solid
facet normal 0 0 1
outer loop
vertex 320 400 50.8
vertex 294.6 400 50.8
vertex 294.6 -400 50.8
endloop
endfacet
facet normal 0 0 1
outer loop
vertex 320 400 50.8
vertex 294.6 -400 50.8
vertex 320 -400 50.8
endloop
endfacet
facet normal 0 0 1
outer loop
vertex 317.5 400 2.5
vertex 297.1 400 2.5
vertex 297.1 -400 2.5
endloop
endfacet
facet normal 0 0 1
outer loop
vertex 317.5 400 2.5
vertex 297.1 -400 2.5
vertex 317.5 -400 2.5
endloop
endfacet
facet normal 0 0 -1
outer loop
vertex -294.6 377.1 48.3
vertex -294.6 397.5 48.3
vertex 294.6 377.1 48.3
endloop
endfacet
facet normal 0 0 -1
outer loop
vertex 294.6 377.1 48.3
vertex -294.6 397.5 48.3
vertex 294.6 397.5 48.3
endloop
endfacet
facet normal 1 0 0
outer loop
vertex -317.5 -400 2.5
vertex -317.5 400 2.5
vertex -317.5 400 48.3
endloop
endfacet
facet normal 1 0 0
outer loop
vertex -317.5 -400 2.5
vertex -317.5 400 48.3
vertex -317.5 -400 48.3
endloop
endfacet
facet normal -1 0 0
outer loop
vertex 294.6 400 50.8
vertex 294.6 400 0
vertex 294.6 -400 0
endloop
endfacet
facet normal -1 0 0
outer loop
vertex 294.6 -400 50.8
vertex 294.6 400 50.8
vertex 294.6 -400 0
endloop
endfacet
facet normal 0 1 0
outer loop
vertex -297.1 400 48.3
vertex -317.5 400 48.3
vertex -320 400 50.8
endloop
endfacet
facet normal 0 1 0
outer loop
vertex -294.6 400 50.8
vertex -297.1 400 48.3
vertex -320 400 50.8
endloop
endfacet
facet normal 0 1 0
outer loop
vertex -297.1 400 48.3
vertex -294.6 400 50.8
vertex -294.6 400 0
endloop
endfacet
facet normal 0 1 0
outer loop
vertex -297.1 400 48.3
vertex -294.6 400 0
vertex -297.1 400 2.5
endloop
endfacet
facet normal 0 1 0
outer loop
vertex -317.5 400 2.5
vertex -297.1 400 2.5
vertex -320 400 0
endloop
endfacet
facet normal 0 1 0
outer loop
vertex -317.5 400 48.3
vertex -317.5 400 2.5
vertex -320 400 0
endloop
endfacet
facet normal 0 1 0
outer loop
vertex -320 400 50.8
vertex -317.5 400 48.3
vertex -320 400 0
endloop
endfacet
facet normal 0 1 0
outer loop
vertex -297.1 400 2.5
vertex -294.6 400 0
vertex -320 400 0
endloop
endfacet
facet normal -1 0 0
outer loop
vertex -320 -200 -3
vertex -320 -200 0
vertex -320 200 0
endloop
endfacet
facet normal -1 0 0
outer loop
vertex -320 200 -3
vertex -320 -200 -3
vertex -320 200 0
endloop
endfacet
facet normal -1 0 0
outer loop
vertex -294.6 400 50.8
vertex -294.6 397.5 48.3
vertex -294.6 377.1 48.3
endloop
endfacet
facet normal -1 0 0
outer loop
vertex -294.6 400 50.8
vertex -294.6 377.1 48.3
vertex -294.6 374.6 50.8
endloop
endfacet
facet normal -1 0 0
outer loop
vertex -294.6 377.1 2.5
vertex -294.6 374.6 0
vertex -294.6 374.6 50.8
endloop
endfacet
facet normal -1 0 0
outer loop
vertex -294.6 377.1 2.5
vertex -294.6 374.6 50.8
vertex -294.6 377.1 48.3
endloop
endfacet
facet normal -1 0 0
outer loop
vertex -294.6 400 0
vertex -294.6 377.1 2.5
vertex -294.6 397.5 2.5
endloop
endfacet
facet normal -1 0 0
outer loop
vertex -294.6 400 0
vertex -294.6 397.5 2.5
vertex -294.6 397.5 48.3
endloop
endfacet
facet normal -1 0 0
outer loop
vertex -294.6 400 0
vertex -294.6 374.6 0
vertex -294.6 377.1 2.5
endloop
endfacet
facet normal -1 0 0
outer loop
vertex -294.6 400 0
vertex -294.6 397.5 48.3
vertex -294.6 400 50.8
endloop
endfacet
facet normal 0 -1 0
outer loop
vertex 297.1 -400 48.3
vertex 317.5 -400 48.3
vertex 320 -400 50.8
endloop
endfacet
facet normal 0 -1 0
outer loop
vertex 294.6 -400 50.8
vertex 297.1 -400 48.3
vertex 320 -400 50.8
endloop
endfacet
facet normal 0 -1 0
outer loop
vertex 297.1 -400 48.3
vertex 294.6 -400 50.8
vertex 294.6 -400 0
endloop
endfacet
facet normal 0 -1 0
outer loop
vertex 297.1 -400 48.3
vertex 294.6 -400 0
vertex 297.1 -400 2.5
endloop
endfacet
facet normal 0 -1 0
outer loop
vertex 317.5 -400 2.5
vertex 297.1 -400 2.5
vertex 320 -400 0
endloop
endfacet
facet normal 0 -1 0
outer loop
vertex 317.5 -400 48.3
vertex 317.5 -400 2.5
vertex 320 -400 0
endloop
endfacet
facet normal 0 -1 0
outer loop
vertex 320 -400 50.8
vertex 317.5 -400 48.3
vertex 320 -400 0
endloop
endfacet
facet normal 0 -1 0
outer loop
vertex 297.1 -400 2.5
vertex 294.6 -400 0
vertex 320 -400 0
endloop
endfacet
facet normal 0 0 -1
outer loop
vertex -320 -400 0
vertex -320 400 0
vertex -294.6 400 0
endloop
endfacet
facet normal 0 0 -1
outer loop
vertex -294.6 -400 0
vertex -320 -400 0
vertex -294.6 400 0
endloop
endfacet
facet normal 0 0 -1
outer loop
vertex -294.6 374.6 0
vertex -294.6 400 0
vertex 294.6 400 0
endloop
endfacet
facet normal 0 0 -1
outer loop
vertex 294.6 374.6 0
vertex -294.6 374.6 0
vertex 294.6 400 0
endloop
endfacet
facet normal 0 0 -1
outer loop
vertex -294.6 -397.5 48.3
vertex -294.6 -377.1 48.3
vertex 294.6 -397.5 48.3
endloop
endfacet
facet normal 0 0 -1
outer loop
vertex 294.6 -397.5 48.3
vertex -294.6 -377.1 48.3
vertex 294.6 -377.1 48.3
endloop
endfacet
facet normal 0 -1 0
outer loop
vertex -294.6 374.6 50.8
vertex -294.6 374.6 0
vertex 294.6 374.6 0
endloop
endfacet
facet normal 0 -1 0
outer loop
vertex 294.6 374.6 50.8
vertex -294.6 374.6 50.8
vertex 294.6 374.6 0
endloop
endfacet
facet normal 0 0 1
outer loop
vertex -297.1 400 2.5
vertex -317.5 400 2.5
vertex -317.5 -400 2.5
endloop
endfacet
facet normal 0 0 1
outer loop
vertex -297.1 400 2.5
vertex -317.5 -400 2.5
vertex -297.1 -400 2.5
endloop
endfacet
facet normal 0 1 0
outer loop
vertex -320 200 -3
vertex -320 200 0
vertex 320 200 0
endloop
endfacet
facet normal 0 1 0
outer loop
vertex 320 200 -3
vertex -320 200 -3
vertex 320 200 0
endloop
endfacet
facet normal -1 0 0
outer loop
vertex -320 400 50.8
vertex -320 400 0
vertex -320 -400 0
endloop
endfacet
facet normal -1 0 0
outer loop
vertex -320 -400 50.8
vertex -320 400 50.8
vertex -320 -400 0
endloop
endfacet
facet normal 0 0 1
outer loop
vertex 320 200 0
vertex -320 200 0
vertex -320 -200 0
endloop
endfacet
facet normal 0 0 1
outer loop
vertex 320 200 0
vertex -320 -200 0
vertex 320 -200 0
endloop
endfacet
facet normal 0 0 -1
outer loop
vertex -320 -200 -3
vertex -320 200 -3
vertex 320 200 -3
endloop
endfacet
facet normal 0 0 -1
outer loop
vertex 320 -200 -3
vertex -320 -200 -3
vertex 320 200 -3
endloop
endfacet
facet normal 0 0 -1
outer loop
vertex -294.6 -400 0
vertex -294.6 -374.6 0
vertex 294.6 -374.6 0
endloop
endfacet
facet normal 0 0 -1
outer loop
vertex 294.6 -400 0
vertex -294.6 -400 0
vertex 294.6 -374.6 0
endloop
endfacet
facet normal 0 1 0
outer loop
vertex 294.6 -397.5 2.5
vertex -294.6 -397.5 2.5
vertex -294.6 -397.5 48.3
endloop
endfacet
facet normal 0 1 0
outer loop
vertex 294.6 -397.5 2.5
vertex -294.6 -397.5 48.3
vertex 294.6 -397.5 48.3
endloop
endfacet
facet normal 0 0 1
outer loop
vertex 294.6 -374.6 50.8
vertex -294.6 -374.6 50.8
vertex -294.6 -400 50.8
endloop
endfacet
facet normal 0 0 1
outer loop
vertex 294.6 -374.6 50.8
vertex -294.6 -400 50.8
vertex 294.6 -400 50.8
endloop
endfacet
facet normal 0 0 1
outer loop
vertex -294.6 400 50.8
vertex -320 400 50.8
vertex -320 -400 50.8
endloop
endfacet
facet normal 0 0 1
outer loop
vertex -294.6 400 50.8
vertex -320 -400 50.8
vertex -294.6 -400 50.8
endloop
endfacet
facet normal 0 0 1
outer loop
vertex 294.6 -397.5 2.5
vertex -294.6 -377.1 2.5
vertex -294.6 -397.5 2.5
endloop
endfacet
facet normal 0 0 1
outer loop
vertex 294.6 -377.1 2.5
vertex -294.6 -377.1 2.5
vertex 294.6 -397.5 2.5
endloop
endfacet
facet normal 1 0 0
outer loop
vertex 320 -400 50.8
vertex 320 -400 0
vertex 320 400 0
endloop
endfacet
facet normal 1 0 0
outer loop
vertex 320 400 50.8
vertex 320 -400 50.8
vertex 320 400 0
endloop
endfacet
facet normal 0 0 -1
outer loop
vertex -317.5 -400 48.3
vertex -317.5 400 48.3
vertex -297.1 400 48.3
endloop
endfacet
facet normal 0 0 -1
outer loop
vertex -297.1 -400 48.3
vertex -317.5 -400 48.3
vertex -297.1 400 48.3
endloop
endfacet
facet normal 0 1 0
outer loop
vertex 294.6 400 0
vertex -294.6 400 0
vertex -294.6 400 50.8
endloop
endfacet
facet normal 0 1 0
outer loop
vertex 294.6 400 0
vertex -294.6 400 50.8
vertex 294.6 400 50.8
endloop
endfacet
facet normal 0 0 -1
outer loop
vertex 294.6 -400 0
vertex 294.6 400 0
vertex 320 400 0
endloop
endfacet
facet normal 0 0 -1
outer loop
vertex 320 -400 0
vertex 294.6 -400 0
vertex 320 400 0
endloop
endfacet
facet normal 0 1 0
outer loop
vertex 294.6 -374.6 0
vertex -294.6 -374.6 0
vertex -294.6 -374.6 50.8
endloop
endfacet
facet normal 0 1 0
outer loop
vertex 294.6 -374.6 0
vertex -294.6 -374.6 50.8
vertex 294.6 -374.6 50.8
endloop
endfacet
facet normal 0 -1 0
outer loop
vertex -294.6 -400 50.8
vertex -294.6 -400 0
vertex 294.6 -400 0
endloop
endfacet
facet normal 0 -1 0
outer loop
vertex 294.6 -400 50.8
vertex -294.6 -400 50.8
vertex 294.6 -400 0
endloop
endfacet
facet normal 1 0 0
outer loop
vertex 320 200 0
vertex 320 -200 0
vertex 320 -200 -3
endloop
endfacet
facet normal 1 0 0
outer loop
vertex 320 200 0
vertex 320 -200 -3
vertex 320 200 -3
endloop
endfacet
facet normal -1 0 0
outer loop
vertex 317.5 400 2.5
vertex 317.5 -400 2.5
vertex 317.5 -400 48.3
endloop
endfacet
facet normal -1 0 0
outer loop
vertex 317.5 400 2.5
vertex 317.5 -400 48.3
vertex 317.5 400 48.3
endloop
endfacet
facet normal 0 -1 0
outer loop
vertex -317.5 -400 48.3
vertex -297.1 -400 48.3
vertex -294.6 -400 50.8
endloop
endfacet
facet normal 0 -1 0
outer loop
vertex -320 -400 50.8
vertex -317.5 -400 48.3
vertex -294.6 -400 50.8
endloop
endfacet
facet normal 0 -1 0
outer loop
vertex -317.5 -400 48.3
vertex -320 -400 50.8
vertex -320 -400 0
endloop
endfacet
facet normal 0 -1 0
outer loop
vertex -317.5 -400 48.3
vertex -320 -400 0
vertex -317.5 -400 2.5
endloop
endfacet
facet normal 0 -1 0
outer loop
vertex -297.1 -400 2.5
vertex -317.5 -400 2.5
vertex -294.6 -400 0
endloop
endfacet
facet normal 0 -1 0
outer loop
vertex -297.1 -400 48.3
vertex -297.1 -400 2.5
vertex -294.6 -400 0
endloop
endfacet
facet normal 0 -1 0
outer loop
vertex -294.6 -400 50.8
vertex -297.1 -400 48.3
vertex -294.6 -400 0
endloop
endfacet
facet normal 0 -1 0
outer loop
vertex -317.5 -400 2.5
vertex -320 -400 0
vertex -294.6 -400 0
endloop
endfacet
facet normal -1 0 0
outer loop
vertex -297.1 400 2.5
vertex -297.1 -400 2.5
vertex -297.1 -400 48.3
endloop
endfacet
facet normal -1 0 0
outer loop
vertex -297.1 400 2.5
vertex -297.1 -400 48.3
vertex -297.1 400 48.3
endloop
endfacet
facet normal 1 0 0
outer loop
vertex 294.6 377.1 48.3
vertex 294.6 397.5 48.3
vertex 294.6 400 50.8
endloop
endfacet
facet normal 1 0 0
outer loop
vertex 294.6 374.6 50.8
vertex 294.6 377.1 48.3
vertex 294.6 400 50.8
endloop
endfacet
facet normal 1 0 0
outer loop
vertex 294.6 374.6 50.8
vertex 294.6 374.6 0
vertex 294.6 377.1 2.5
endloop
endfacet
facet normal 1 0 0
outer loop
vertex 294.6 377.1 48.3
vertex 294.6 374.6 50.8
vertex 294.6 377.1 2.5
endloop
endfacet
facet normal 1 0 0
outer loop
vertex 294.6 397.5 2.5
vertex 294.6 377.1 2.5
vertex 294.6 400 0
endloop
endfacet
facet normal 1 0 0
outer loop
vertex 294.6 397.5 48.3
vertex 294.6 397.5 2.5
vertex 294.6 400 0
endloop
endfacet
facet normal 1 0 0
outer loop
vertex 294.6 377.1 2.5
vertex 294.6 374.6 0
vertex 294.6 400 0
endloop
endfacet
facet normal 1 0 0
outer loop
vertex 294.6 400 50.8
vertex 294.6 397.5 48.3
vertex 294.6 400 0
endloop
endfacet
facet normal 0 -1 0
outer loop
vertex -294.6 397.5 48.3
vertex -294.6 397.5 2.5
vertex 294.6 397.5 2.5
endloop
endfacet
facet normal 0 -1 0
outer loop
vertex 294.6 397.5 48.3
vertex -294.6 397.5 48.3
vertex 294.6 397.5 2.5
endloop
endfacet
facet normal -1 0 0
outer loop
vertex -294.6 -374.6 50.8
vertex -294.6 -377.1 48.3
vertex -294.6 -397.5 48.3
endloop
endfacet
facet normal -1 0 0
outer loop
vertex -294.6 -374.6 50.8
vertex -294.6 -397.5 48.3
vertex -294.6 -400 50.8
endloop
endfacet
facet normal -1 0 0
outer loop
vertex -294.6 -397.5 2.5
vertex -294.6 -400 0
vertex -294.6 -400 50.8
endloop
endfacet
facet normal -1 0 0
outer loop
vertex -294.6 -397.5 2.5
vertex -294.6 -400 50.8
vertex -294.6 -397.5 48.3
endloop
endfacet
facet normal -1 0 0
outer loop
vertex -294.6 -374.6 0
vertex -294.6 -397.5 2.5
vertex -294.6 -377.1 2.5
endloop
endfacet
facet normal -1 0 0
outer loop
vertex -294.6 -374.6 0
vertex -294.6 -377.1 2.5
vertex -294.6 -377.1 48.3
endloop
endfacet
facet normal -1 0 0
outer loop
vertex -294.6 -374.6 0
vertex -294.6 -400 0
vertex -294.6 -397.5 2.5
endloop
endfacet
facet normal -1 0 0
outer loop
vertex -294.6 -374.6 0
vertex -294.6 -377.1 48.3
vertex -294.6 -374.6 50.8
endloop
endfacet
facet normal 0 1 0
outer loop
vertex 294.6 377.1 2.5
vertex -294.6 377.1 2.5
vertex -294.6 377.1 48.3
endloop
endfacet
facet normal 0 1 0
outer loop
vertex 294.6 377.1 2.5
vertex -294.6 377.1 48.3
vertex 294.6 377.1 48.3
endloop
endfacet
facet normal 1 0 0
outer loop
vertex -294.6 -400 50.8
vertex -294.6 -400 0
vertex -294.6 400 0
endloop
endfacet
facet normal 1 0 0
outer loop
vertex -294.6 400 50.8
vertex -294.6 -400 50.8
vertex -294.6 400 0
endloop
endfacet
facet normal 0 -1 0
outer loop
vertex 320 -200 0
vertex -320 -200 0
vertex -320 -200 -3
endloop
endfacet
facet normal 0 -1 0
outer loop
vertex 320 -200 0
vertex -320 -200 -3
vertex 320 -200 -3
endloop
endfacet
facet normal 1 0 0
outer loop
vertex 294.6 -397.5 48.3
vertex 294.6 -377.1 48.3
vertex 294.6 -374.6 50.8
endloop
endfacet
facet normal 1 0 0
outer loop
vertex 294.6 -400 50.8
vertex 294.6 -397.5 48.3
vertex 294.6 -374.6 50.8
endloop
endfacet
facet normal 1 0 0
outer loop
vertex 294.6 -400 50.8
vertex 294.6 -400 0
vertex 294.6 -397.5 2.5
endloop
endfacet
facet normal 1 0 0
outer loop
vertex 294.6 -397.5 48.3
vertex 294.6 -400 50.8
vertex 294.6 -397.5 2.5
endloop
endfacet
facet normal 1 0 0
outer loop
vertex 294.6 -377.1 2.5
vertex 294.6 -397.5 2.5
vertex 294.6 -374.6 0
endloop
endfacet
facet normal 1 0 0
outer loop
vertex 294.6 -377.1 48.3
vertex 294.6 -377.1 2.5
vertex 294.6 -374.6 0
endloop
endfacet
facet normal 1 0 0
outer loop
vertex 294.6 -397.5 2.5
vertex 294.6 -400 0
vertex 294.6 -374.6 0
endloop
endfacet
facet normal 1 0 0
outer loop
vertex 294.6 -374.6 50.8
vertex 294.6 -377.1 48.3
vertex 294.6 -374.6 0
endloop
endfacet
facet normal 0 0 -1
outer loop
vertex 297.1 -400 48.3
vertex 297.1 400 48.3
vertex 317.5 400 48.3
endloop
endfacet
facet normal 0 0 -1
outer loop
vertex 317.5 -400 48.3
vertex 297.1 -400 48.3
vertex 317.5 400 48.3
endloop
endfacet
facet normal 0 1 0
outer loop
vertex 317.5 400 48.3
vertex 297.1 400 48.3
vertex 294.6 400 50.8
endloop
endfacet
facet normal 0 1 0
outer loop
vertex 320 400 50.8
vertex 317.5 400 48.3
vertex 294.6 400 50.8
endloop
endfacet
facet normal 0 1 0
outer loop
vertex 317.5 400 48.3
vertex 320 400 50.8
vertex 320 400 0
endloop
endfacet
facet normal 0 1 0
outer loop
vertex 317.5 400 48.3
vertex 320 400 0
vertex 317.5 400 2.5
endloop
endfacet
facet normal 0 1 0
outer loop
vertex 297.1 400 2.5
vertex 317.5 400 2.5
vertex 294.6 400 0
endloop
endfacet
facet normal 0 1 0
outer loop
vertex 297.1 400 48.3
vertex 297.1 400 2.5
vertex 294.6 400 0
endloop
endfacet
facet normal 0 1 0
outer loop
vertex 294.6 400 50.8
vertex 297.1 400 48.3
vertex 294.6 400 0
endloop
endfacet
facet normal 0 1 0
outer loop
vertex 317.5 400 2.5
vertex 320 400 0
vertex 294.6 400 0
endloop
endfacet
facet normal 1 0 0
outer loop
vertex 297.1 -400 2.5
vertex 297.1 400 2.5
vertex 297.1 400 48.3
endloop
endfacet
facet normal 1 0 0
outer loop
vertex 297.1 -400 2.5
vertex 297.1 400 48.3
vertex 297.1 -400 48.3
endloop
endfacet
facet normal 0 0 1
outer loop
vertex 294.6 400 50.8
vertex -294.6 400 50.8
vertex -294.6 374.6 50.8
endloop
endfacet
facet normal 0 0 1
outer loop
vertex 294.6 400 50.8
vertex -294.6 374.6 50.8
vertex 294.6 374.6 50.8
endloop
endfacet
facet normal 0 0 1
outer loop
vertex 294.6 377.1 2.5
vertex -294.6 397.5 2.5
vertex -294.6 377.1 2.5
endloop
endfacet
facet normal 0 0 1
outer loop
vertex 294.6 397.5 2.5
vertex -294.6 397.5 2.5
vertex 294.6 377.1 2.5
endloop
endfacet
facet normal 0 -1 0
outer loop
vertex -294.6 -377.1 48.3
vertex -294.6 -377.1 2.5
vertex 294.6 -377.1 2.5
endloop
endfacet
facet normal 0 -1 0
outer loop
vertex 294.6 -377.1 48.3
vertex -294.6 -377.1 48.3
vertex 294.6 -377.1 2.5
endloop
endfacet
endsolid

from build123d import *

# Parameters (mm, degrees)
F1_DEPTH = 50.8
F0_W     = 589.2
F0_H     = 25.4
F2_DEPTH = 50.8
F3_DEPTH = 50.8
F4_DEPTH = 50.8
F5_W     = 640
F5_H     = 400
F6_DEPTH = 3
F7_T     = -2.5
F7_2_T   = -2.5
F7_3_T   = -2.5
F7_4_T   = -2.5


with BuildPart() as f1:
    # F0 (on Top) → F1 (new body)
    with BuildSketch(Plane.XY):
        Polygon((-294.6, 400), (-320, 400), (-320, -400), (-294.6, -400), (-294.6, -374.6), (-294.6, 374.6), align=None)
    extrude(amount=F1_DEPTH)

    # F7
    f7_openings = [f1.faces().sort_by_distance(p)[0] for p in [
        (-307.3, -400, 25.4),
        (-307.3, 400, 25.4),
    ]]
    offset(amount=F7_T, openings=f7_openings)


with BuildPart() as f2:
    # F0 (on Top) → F2 (new body)
    with BuildSketch(Plane.XY):
        with Locations((0, 387.3)):
            Rectangle(F0_W, F0_H)
    extrude(amount=F2_DEPTH)

    # F7#3
    f7_3_openings = [f2.faces().sort_by_distance(p)[0] for p in [
        (294.6, 387.3, 25.4),
        (-294.6, 387.3, 25.4),
    ]]
    offset(amount=F7_3_T, openings=f7_3_openings)


with BuildPart() as f3:
    # F0 (on Top) → F3 (new body)
    with BuildSketch(Plane.XY):
        Polygon((320, 400), (294.6, 400), (294.6, 374.6), (294.6, -374.6), (294.6, -400), (320, -400), align=None)
    extrude(amount=F3_DEPTH)

    # F7#2
    f7_2_openings = [f3.faces().sort_by_distance(p)[0] for p in [
        (307.3, -400, 25.4),
        (307.3, 400, 25.4),
    ]]
    offset(amount=F7_2_T, openings=f7_2_openings)


with BuildPart() as f4:
    # F0 (on Top) → F4 (new body)
    with BuildSketch(Plane.XY):
        with Locations((0, -387.3)):
            Rectangle(F0_W, F0_H)
    extrude(amount=F4_DEPTH)

    # F7#4
    f7_4_openings = [f4.faces().sort_by_distance(p)[0] for p in [
        (-294.6, -387.3, 25.4),
        (294.6, -387.3, 25.4),
    ]]
    offset(amount=F7_4_T, openings=f7_4_openings)


with BuildPart() as f6:
    # F5 (on face) → F6 (new body)
    with BuildSketch(Plane.XY):
        Rectangle(F5_W, F5_H)
    extrude(amount=-F6_DEPTH)


solid = Compound([f1.part, f2.part, f3.part, f4.part, f6.part])
